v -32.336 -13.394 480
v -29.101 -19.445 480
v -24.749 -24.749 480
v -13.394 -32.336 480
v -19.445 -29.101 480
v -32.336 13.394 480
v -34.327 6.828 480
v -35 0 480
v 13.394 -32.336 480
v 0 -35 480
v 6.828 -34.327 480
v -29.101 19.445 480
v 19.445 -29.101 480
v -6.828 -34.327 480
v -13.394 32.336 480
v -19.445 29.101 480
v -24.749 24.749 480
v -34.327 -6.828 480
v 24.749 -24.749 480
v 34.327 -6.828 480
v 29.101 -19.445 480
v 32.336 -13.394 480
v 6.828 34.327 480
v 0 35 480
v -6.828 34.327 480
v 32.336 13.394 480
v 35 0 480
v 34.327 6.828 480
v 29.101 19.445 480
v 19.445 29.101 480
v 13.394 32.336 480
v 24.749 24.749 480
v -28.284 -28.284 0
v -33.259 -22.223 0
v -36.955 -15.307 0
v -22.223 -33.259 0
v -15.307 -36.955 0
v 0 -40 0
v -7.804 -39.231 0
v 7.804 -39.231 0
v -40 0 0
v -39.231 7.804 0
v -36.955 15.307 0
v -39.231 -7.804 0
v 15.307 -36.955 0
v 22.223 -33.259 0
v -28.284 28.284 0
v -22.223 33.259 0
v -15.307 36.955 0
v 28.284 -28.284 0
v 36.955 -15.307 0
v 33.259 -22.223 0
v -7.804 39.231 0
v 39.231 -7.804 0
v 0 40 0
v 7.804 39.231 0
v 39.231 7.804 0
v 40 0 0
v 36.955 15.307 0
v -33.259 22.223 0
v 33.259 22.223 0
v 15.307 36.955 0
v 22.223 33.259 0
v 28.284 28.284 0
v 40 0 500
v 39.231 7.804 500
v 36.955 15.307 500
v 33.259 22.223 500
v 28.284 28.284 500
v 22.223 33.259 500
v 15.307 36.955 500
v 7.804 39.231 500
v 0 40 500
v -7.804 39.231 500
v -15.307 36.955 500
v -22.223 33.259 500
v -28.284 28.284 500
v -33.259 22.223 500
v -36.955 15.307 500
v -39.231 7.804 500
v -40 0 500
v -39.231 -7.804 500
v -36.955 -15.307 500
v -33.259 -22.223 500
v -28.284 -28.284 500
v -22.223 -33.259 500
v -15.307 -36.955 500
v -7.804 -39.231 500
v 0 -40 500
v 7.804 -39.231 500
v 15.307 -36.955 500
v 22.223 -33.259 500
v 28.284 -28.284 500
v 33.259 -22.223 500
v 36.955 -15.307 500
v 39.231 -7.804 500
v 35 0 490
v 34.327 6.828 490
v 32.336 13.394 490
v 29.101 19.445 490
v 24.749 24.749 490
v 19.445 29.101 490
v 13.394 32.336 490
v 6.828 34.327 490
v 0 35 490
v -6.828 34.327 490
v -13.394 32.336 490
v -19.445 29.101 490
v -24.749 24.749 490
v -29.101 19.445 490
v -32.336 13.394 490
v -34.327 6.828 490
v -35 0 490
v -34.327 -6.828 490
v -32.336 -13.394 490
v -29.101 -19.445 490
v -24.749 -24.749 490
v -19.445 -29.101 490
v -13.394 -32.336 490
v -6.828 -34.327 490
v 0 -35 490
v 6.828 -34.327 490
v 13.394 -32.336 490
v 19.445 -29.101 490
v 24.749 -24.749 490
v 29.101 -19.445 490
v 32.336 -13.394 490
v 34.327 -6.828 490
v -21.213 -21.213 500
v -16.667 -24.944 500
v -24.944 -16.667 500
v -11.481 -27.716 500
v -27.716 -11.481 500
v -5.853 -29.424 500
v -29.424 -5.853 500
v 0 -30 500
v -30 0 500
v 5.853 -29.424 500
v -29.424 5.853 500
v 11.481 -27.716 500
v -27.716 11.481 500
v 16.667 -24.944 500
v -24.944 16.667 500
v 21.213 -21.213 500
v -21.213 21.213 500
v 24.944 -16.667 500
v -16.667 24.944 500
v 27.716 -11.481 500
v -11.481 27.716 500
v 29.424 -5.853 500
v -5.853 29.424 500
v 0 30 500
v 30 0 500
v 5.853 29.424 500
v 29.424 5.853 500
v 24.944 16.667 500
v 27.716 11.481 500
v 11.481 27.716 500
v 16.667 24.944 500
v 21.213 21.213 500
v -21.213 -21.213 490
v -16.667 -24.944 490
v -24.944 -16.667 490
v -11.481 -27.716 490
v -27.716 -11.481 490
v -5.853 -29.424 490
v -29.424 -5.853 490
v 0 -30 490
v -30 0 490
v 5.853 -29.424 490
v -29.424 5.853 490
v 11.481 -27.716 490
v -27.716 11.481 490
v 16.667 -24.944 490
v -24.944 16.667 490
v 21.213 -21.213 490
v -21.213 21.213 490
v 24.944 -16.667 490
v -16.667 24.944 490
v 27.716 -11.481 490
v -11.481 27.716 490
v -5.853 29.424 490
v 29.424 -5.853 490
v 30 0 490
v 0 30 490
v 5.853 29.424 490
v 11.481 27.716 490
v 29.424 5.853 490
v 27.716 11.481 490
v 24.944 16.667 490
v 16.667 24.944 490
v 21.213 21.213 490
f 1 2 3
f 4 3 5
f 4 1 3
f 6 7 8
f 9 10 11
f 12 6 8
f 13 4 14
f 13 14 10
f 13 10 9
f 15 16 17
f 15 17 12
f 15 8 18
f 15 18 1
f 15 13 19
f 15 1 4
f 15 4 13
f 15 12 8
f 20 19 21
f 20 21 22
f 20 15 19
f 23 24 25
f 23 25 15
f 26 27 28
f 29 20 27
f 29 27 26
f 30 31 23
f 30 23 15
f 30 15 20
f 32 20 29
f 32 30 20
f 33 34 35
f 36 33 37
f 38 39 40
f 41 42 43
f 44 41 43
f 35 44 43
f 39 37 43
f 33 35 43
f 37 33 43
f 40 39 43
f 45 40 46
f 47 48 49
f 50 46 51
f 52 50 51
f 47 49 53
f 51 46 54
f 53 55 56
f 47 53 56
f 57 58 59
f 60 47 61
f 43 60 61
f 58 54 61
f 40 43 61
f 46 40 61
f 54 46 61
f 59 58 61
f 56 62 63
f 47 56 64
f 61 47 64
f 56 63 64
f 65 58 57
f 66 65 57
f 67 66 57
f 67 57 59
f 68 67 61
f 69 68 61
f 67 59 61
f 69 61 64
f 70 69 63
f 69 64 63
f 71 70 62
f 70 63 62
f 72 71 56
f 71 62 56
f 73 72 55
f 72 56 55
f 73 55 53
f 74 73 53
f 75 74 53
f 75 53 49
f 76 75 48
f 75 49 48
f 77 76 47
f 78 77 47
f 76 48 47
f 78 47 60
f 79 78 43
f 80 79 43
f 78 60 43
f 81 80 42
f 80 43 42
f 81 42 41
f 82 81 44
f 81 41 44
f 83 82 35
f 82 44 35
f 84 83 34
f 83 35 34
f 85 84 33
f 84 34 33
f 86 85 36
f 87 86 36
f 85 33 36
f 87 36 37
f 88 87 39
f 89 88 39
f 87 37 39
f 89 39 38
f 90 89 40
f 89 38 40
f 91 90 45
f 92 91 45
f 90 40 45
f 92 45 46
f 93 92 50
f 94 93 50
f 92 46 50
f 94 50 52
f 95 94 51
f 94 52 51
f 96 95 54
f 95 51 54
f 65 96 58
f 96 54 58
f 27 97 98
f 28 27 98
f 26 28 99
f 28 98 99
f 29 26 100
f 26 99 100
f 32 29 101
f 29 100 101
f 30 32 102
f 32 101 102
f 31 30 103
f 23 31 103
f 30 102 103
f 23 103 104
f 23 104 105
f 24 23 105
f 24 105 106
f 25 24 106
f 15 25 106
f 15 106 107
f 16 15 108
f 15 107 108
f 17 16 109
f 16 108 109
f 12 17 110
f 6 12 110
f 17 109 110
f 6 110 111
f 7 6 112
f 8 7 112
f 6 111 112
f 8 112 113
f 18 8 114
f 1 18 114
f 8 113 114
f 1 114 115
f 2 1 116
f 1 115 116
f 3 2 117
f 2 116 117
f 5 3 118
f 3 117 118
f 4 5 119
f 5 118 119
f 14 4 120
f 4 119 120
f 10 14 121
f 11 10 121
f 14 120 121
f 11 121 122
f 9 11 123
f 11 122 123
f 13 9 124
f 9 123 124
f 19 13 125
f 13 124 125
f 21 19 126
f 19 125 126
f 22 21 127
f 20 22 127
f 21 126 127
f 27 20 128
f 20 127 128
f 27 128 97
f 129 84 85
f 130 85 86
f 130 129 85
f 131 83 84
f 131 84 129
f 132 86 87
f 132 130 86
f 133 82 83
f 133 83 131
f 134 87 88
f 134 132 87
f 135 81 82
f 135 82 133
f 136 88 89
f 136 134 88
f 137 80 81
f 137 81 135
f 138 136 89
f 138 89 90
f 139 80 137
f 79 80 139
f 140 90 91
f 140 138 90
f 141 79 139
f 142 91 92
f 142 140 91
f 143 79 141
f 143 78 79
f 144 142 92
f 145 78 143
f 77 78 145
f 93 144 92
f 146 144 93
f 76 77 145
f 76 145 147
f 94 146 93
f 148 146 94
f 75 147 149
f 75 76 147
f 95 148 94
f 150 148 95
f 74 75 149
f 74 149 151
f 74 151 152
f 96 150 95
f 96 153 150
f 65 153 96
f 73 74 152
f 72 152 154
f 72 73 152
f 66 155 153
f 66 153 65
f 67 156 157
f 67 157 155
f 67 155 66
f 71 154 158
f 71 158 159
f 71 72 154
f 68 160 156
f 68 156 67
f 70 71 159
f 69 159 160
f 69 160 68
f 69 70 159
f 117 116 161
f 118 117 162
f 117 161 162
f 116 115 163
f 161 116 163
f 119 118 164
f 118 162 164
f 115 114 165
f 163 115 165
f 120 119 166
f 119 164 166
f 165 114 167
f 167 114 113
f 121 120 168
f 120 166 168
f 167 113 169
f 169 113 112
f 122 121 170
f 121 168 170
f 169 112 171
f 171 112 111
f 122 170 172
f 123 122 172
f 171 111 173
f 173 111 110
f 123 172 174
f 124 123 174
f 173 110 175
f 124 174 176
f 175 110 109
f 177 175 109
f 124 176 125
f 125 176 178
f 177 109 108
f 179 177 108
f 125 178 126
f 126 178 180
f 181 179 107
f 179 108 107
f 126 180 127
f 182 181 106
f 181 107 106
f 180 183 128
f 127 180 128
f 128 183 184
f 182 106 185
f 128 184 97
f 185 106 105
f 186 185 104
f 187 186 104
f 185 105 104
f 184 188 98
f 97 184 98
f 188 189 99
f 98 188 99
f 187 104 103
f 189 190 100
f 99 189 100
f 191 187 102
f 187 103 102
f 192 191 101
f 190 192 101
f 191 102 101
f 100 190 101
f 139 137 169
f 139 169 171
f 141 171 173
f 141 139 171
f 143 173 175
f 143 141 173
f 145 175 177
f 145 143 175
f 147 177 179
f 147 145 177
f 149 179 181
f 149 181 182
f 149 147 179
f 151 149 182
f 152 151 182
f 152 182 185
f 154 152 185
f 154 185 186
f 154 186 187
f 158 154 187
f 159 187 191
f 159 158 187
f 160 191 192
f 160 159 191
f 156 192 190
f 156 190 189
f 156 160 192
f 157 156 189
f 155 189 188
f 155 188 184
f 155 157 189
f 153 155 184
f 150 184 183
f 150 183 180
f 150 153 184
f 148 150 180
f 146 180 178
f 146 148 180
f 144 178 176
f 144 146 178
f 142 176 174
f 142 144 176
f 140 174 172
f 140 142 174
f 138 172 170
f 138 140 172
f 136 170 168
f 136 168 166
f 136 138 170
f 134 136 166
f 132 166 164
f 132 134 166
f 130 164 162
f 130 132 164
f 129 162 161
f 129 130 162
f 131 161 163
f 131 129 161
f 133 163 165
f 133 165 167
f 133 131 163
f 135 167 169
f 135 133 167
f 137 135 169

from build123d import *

# Parameters (mm, degrees)
SKETCH1_R           = 40
BOSS_EXTRUDE1_DEPTH = 500
SKETCH2_R           = 30
CUT_EXTRUDE1_DEPTH  = 10
SKETCH3_R           = 35
CUT_EXTRUDE2_DEPTH  = 10


with BuildPart() as part:
    # Sketch1 → Boss-Extrude1 (new body)
    with BuildSketch(Plane.XY):
        Circle(SKETCH1_R)
    extrude(amount=BOSS_EXTRUDE1_DEPTH)

    # Sketch2 → Cut-Extrude1 (cut)
    with BuildSketch(Plane(origin=(0, 0, 500), x_dir=(-1, 0, 0), z_dir=(0, 0, -1))):
        Circle(SKETCH2_R)
    extrude(amount=CUT_EXTRUDE1_DEPTH, mode=Mode.SUBTRACT)

    # Sketch3 → Cut-Extrude2 (cut)
    with BuildSketch(Plane.XY.offset(490)):
        Circle(SKETCH3_R)
    extrude(amount=-CUT_EXTRUDE2_DEPTH, mode=Mode.SUBTRACT)


solid = part.part
